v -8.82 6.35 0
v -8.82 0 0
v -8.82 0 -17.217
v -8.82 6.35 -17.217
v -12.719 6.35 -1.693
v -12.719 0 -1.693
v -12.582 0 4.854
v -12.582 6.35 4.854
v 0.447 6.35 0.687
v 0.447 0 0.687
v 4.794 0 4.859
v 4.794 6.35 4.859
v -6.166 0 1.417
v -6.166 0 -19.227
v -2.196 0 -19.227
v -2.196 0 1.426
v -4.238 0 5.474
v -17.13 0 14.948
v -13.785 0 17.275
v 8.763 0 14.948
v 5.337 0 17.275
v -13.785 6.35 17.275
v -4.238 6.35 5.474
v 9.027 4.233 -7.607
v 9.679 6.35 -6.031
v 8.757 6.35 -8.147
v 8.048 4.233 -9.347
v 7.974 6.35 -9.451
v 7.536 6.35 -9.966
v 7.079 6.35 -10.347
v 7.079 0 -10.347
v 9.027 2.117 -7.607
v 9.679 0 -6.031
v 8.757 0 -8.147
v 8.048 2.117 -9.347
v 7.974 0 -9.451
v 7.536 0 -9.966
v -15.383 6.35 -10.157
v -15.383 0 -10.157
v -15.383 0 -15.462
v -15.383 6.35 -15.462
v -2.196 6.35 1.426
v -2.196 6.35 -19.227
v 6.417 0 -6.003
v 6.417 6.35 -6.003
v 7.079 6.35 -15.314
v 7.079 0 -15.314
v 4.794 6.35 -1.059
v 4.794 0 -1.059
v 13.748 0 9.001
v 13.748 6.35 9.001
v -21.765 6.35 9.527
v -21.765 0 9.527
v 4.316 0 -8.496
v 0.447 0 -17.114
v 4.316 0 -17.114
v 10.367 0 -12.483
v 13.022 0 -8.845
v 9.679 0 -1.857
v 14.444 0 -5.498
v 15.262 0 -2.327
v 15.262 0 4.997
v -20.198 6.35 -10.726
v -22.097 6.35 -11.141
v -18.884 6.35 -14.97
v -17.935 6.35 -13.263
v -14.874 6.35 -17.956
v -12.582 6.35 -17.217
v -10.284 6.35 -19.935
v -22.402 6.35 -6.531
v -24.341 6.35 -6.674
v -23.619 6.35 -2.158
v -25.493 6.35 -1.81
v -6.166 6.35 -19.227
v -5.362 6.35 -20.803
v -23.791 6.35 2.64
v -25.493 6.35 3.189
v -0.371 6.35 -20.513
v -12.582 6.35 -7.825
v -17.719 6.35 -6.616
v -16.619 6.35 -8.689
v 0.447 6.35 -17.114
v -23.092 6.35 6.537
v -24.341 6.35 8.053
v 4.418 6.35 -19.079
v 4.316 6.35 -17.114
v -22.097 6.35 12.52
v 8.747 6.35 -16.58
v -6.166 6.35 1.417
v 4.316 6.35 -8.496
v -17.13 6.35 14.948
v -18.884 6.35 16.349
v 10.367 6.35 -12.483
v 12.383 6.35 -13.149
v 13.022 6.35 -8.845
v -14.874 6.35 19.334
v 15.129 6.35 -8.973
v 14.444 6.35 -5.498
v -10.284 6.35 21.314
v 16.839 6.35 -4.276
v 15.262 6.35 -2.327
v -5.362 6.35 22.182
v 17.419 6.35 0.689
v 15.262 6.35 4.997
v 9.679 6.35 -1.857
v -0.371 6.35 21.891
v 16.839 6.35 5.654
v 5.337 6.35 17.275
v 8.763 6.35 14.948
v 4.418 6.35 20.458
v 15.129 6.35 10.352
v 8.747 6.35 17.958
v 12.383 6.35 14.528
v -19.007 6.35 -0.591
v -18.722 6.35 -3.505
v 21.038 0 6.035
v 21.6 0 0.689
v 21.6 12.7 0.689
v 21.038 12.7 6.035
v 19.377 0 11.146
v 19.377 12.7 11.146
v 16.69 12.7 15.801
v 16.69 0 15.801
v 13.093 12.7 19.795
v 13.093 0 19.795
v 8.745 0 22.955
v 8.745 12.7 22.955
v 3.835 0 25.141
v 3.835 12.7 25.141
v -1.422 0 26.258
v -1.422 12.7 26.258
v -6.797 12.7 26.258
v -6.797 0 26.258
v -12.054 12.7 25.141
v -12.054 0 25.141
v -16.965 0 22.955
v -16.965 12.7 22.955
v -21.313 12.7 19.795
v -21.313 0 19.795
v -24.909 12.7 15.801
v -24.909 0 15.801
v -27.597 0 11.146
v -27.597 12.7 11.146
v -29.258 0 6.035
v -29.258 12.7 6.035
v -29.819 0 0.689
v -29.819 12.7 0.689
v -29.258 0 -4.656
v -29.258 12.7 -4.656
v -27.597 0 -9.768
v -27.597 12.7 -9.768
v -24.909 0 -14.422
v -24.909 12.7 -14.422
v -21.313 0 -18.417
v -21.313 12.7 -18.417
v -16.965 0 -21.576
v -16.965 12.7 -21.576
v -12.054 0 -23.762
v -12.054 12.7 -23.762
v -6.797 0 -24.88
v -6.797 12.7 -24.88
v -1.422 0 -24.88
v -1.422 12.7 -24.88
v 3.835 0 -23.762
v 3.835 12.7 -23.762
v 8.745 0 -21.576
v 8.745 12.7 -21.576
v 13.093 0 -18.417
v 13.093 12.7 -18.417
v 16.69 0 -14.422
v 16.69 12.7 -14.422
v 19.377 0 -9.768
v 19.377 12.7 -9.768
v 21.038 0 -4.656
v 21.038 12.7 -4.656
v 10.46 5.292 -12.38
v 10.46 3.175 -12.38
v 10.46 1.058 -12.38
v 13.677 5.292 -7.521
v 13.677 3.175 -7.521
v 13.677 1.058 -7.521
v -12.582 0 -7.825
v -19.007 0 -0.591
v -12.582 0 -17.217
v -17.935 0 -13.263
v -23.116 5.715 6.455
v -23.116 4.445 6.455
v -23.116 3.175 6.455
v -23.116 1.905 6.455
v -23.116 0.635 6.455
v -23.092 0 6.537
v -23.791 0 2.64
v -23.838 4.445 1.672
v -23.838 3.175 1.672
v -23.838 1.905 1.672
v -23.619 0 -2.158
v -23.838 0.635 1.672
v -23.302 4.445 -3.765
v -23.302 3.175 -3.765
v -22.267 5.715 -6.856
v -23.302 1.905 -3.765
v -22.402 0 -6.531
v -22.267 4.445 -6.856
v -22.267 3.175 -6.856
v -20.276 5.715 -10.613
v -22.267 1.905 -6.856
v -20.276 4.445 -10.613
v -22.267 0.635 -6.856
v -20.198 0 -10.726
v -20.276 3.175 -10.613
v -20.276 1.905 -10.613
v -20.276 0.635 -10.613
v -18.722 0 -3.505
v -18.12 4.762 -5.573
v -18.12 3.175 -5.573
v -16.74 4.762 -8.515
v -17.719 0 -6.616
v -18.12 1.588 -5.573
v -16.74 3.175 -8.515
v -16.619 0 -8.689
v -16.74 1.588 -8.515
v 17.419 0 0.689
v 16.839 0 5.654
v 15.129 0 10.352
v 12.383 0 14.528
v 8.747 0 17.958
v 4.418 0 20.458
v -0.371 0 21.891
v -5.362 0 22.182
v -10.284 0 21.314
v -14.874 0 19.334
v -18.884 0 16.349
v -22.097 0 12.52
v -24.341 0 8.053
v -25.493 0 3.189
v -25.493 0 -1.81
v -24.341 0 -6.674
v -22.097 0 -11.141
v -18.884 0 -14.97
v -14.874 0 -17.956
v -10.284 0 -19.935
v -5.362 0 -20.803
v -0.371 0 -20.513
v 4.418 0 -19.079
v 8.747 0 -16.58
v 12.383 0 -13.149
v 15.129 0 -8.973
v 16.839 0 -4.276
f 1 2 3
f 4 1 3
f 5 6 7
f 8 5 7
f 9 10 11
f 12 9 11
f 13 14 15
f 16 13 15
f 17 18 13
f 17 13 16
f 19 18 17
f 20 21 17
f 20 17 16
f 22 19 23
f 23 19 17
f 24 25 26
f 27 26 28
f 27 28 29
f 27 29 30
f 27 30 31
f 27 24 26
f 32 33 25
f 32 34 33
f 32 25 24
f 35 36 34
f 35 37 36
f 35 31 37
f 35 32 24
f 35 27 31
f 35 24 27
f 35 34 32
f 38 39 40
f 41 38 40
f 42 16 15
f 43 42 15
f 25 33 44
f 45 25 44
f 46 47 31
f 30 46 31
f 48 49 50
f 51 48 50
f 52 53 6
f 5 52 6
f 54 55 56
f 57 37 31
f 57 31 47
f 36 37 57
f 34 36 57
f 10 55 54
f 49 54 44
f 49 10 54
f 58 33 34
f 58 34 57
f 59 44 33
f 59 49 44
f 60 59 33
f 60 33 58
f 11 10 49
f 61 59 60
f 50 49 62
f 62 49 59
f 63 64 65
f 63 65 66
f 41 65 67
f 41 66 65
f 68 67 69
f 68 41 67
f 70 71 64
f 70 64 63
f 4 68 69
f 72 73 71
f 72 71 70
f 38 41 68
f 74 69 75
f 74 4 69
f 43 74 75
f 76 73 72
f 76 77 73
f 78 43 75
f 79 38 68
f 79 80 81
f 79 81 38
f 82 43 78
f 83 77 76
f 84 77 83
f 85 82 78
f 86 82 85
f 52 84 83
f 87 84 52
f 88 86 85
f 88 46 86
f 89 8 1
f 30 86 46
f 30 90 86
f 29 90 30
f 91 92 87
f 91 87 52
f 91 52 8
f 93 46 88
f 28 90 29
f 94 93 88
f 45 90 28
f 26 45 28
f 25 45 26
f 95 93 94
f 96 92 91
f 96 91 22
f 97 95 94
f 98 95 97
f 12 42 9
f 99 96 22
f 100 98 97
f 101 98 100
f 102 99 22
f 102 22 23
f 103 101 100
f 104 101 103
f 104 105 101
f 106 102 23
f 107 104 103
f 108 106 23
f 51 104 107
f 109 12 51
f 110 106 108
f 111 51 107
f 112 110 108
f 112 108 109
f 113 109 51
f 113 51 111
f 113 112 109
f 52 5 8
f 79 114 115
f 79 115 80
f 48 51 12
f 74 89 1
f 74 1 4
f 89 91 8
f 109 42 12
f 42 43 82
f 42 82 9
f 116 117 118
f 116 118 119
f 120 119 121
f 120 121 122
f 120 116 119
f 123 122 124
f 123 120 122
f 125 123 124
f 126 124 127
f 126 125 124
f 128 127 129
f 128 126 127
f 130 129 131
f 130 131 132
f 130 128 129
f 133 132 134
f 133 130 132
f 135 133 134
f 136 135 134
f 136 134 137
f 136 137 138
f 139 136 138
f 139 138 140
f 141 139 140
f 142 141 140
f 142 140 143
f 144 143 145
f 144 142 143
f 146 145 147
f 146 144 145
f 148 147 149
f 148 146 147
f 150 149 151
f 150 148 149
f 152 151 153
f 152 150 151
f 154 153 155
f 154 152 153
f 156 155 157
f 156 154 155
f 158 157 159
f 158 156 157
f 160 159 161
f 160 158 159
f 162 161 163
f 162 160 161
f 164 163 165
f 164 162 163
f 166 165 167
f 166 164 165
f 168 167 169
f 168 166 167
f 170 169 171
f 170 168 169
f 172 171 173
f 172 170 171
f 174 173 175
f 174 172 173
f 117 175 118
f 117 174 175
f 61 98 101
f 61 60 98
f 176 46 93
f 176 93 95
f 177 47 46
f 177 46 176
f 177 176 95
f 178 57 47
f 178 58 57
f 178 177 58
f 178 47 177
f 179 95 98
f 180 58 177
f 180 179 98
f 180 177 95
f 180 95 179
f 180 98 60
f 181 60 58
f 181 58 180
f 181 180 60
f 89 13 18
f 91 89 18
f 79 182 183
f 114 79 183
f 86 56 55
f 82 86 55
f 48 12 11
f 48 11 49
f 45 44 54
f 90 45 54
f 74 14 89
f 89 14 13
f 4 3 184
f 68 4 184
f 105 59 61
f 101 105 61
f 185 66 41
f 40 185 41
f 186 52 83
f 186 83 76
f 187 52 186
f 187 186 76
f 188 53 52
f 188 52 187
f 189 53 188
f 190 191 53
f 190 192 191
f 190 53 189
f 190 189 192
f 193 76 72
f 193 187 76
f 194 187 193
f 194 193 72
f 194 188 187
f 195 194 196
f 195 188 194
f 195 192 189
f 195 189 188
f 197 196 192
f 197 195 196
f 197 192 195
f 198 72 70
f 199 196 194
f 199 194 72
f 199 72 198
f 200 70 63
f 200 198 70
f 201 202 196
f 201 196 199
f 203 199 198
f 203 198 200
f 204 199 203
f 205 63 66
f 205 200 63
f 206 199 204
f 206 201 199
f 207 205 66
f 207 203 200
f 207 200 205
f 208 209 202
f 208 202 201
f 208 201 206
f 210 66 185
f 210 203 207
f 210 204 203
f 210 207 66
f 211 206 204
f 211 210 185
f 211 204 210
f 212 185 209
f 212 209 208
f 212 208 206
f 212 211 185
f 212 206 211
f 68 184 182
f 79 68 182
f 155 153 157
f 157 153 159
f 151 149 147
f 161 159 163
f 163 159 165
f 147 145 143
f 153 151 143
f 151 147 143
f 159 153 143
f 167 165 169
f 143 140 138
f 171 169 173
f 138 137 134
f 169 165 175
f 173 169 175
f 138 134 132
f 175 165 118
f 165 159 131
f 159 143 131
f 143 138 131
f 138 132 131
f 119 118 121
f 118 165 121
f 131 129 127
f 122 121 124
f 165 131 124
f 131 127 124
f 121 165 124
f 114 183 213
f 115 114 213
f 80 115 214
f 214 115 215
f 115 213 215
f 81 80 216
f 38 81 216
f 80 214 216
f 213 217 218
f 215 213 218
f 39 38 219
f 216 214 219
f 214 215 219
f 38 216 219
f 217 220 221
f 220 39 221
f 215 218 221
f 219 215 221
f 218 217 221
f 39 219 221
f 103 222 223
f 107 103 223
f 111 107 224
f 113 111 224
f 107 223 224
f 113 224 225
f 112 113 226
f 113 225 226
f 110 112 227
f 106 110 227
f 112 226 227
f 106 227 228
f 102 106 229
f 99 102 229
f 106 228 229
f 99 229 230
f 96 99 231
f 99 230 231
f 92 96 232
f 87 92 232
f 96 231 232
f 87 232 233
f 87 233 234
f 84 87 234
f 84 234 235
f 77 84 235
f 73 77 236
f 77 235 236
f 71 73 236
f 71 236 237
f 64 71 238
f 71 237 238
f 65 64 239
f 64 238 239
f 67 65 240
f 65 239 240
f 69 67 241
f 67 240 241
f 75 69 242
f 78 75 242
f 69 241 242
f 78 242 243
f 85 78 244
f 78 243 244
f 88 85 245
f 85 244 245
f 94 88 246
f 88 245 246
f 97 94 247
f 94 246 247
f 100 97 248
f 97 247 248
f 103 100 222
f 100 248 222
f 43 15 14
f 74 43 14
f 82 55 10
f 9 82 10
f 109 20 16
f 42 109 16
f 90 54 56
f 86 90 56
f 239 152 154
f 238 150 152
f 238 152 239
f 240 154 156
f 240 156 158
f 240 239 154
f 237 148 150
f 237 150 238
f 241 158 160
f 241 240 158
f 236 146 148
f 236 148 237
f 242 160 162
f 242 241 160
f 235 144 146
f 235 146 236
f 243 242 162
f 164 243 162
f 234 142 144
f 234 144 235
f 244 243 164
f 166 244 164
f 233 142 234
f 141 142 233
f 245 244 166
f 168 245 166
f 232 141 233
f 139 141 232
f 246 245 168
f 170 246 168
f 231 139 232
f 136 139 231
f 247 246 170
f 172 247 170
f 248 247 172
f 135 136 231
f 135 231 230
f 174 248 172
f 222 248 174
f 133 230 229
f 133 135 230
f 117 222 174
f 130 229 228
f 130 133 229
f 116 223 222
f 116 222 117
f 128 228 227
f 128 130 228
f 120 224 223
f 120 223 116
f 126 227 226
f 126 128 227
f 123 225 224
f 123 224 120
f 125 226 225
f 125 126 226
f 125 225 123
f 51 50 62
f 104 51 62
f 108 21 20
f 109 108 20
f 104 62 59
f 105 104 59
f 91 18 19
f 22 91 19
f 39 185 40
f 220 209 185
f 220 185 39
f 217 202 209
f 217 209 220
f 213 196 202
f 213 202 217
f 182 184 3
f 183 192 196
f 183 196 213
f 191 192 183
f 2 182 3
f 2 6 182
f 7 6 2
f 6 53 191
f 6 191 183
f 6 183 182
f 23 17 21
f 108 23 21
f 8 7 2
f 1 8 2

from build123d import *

# Parameters (mm, degrees)
F0_R     = 25.7096861459
F0_R_2   = 21.5291868396
F1_DEPTH = 12.7
F2_DEPTH = 6.35


with BuildPart() as f1:
    # F0 (on Front) → F1 (new body)
    with BuildSketch(Plane.XZ):
        with Locations((-4.1097430512, 0.6892834396)):
            Circle(F0_R)
        with Locations((-4.1097430512, 0.6892834396)):
            Circle(F0_R_2, mode=Mode.SUBTRACT)
        with Locations((-4.1097430512, 0.6892834396)):
            Circle(F0_R_2)
        with BuildLine():
            add(Edge.make_bspline(
                [(-21.7646267265, 9.5272203907), (-22.0361650363, 9.0544517802), (-22.5884434109, 8.0928936123), (-23.1549316669, 6.4432599282), (-23.7184446326, 4.0522965999), (-23.8577617277, 1.6539462794), (-23.873036412, -0.6564562902), (-23.37210285, -3.8672122774), (-22.351295624, -6.8736988545), (-20.4256595912, -10.740114232), (-18.0343458286, -13.2630401234), (-16.2631639399, -14.7318578221), (-15.3828011826, -15.4619310051)],
                knots=[0, 0, 0, 0, 0.0768675769, 0.1563400039, 0.2507506226, 0.3440400191, 0.4356860283, 0.542918844, 0.6517355024, 0.7760210951, 0.88867169, 1, 1, 1, 1], degree=3))
            Line((-21.7646267265, 9.5272203907), (-12.7189774066, -1.692944672))
            Line((-12.7189774066, -1.692944672), (-12.5821670517, 4.8544136807))
            Line((-12.5821670517, 4.8544136807), (-8.8198259473, 0))
            Line((-8.8198259473, 0), (-8.8198259473, -17.2167737037))
            Line((-8.8198259473, -17.2167737037), (-12.5821670517, -17.2167737037))
            Line((-12.5821670517, -17.2167737037), (-12.5821670517, -7.8245121986))
            Line((-12.5821670517, -7.8245121986), (-19.0072003752, -0.591270742))
            add(Edge.make_bspline(
                [(-19.0072003752, -0.591270742), (-19.0529774008, -1.3011197697), (-18.8961779325, -3.0224064452), (-18.1968595875, -5.5618282654), (-16.9006426097, -8.6077330024), (-15.8092020333, -9.6299122724), (-15.3828011826, -10.1572088897)],
                knots=[0, 0, 0, 0, 0.2376816547, 0.494126058, 0.7736790575, 1, 1, 1, 1], degree=3))
            Line((-15.3828011826, -10.1572088897), (-15.3828011826, -15.4619310051))
        make_face(mode=Mode.SUBTRACT)
        Polygon((-6.1660036445, -19.2273277789), (-6.1660036445, -19.0120320767), (-6.1660036445, 1.4170210343), (-17.1303842217, 14.948152937), (-13.7848015875, 17.2754023224), (-4.2383992113, 5.4741743952), (5.3372876719, 17.2754023224), (8.7634501979, 14.948152937), (-2.1964707835, 1.426110025), (-2.1964707835, -19.2273277789), align=None, mode=Mode.SUBTRACT)
        with BuildLine():
            Line((0.4468376574, -17.1141084284), (0.4468376574, 0.6865304422))
            Line((0.4468376574, 0.6865304422), (4.7943019308, 4.8586851917))
            Line((4.7943019308, 4.8586851917), (4.7943019308, -1.0591812897))
            Line((4.7943019308, -1.0591812897), (13.7482034042, 9.0009113774))
            Line((13.7482034042, 9.0009113774), (15.2618186548, 4.9968691602))
            Line((15.2618186548, 4.9968691602), (9.6785612404, -1.8568894593))
            Line((9.6785612404, -1.8568894593), (15.2618186548, -2.3267676588))
            add(Edge.make_bspline(
                [(7.0791435428, -15.3138078749), (7.6633822301, -14.891566438), (8.8605857195, -14.0262415468), (10.5105583239, -12.413425436), (12.4261537458, -9.9596070935), (13.742152602, -7.5968455621), (14.7711233204, -4.5638277141), (15.2065390721, -3.0454047956), (15.2618186548, -2.3267676588)],
                knots=[0, 0, 0, 0, 0.1516433597, 0.3087204032, 0.4892664729, 0.6610846718, 0.8445997083, 1, 1, 1, 1], degree=3))
            Line((7.0791435428, -15.3138078749), (7.0791435428, -10.3469491005))
            add(Edge.make_bspline(
                [(9.6785612404, -6.0305129737), (9.5054491582, -6.5825324176), (9.0547490041, -7.5936580594), (8.125887942, -9.3747254345), (7.432360992, -10.108098995), (7.0791435428, -10.3469491005)],
                knots=[0, 0, 0, 0, 0.3349951173, 0.6974045589, 1, 1, 1, 1], degree=3))
            Line((9.6785612404, -6.0305129737), (6.4170542173, -6.0028731823))
            Line((6.4170542173, -6.0028731823), (4.316422157, -8.4956227616))
            Line((4.316422157, -8.4956227616), (4.316422157, -17.1141084284))
            Line((4.316422157, -17.1141084284), (0.4468376574, -17.1141084284))
        make_face(mode=Mode.SUBTRACT)
        with BuildLine():
            Line((-12.7189774066, -1.692944672), (-21.7646267265, 9.5272203907))
            add(Edge.make_bspline(
                [(-21.7646267265, 9.5272203907), (-22.0361650363, 9.0544517802), (-22.5884434109, 8.0928936123), (-23.1549316669, 6.4432599282), (-23.7184446326, 4.0522965999), (-23.8577617277, 1.6539462794), (-23.873036412, -0.6564562902), (-23.37210285, -3.8672122774), (-22.351295624, -6.8736988545), (-20.4256595912, -10.740114232), (-18.0343458286, -13.2630401234), (-16.2631639399, -14.7318578221), (-15.3828011826, -15.4619310051)],
                knots=[0, 0, 0, 0, 0.0768675769, 0.1563400039, 0.2507506226, 0.3440400191, 0.4356860283, 0.542918844, 0.6517355024, 0.7760210951, 0.88867169, 1, 1, 1, 1], degree=3))
            Line((-15.3828011826, -15.4619310051), (-15.3828011826, -10.1572088897))
            add(Edge.make_bspline(
                [(-19.0072003752, -0.591270742), (-19.0529774008, -1.3011197697), (-18.8961779325, -3.0224064452), (-18.1968595875, -5.5618282654), (-16.9006426097, -8.6077330024), (-15.8092020333, -9.6299122724), (-15.3828011826, -10.1572088897)],
                knots=[0, 0, 0, 0, 0.2376816547, 0.494126058, 0.7736790575, 1, 1, 1, 1], degree=3))
            Line((-19.0072003752, -0.591270742), (-12.5821670517, -7.8245121986))
            Line((-12.5821670517, -7.8245121986), (-12.5821670517, -17.2167737037))
            Line((-12.5821670517, -17.2167737037), (-8.8198259473, -17.2167737037))
            Line((-8.8198259473, -17.2167737037), (-8.8198259473, 0))
            Line((-8.8198259473, 0), (-12.5821670517, 4.8544136807))
            Line((-12.5821670517, 4.8544136807), (-12.7189774066, -1.692944672))
        make_face()
        Polygon((-6.1660036445, 1.4170210343), (-6.1660036445, -19.0120320767), (-6.1660036445, -19.2273277789), (-2.1964707835, -19.2273277789), (-2.1964707835, 1.426110025), (8.7634501979, 14.948152937), (5.3372876719, 17.2754023224), (-4.2383992113, 5.4741743952), (-13.7848015875, 17.2754023224), (-17.1303842217, 14.948152937), align=None)
        with BuildLine():
            Line((4.7943019308, 4.8586851917), (0.4468376574, 0.6865304422))
            Line((0.4468376574, 0.6865304422), (0.4468376574, -17.1141084284))
            Line((0.4468376574, -17.1141084284), (4.316422157, -17.1141084284))
            Line((4.316422157, -17.1141084284), (4.316422157, -8.4956227616))
            Line((4.316422157, -8.4956227616), (6.4170542173, -6.0028731823))
            Line((6.4170542173, -6.0028731823), (9.6785612404, -6.0305129737))
            add(Edge.make_bspline(
                [(9.6785612404, -6.0305129737), (9.5054491582, -6.5825324176), (9.0547490041, -7.5936580594), (8.125887942, -9.3747254345), (7.432360992, -10.108098995), (7.0791435428, -10.3469491005)],
                knots=[0, 0, 0, 0, 0.3349951173, 0.6974045589, 1, 1, 1, 1], degree=3))
            Line((7.0791435428, -10.3469491005), (7.0791435428, -15.3138078749))
            add(Edge.make_bspline(
                [(7.0791435428, -15.3138078749), (7.6633822301, -14.891566438), (8.8605857195, -14.0262415468), (10.5105583239, -12.413425436), (12.4261537458, -9.9596070935), (13.742152602, -7.5968455621), (14.7711233204, -4.5638277141), (15.2065390721, -3.0454047956), (15.2618186548, -2.3267676588)],
                knots=[0, 0, 0, 0, 0.1516433597, 0.3087204032, 0.4892664729, 0.6610846718, 0.8445997083, 1, 1, 1, 1], degree=3))
            Line((15.2618186548, -2.3267676588), (9.6785612404, -1.8568894593))
            Line((9.6785612404, -1.8568894593), (15.2618186548, 4.9968691602))
            Line((15.2618186548, 4.9968691602), (13.7482034042, 9.0009113774))
            Line((13.7482034042, 9.0009113774), (4.7943019308, -1.0591812897))
            Line((4.7943019308, -1.0591812897), (4.7943019308, 4.8586851917))
        make_face()
    extrude(amount=-F1_DEPTH)

    # F0 (on Front) → F2 (cut)
    with BuildSketch(Plane.XZ):
        with Locations((-4.1097430512, 0.6892834396)):
            Circle(F0_R_2)
        with BuildLine():
            add(Edge.make_bspline(
                [(-21.7646267265, 9.5272203907), (-22.0361650363, 9.0544517802), (-22.5884434109, 8.0928936123), (-23.1549316669, 6.4432599282), (-23.7184446326, 4.0522965999), (-23.8577617277, 1.6539462794), (-23.873036412, -0.6564562902), (-23.37210285, -3.8672122774), (-22.351295624, -6.8736988545), (-20.4256595912, -10.740114232), (-18.0343458286, -13.2630401234), (-16.2631639399, -14.7318578221), (-15.3828011826, -15.4619310051)],
                knots=[0, 0, 0, 0, 0.0768675769, 0.1563400039, 0.2507506226, 0.3440400191, 0.4356860283, 0.542918844, 0.6517355024, 0.7760210951, 0.88867169, 1, 1, 1, 1], degree=3))
            Line((-21.7646267265, 9.5272203907), (-12.7189774066, -1.692944672))
            Line((-12.7189774066, -1.692944672), (-12.5821670517, 4.8544136807))
            Line((-12.5821670517, 4.8544136807), (-8.8198259473, 0))
            Line((-8.8198259473, 0), (-8.8198259473, -17.2167737037))
            Line((-8.8198259473, -17.2167737037), (-12.5821670517, -17.2167737037))
            Line((-12.5821670517, -17.2167737037), (-12.5821670517, -7.8245121986))
            Line((-12.5821670517, -7.8245121986), (-19.0072003752, -0.591270742))
            add(Edge.make_bspline(
                [(-19.0072003752, -0.591270742), (-19.0529774008, -1.3011197697), (-18.8961779325, -3.0224064452), (-18.1968595875, -5.5618282654), (-16.9006426097, -8.6077330024), (-15.8092020333, -9.6299122724), (-15.3828011826, -10.1572088897)],
                knots=[0, 0, 0, 0, 0.2376816547, 0.494126058, 0.7736790575, 1, 1, 1, 1], degree=3))
            Line((-15.3828011826, -10.1572088897), (-15.3828011826, -15.4619310051))
        make_face(mode=Mode.SUBTRACT)
        Polygon((-6.1660036445, -19.2273277789), (-6.1660036445, -19.0120320767), (-6.1660036445, 1.4170210343), (-17.1303842217, 14.948152937), (-13.7848015875, 17.2754023224), (-4.2383992113, 5.4741743952), (5.3372876719, 17.2754023224), (8.7634501979, 14.948152937), (-2.1964707835, 1.426110025), (-2.1964707835, -19.2273277789), align=None, mode=Mode.SUBTRACT)
        with BuildLine():
            Line((0.4468376574, -17.1141084284), (0.4468376574, 0.6865304422))
            Line((0.4468376574, 0.6865304422), (4.7943019308, 4.8586851917))
            Line((4.7943019308, 4.8586851917), (4.7943019308, -1.0591812897))
            Line((4.7943019308, -1.0591812897), (13.7482034042, 9.0009113774))
            Line((13.7482034042, 9.0009113774), (15.2618186548, 4.9968691602))
            Line((15.2618186548, 4.9968691602), (9.6785612404, -1.8568894593))
            Line((9.6785612404, -1.8568894593), (15.2618186548, -2.3267676588))
            add(Edge.make_bspline(
                [(7.0791435428, -15.3138078749), (7.6633822301, -14.891566438), (8.8605857195, -14.0262415468), (10.5105583239, -12.413425436), (12.4261537458, -9.9596070935), (13.742152602, -7.5968455621), (14.7711233204, -4.5638277141), (15.2065390721, -3.0454047956), (15.2618186548, -2.3267676588)],
                knots=[0, 0, 0, 0, 0.1516433597, 0.3087204032, 0.4892664729, 0.6610846718, 0.8445997083, 1, 1, 1, 1], degree=3))
            Line((7.0791435428, -15.3138078749), (7.0791435428, -10.3469491005))
            add(Edge.make_bspline(
                [(9.6785612404, -6.0305129737), (9.5054491582, -6.5825324176), (9.0547490041, -7.5936580594), (8.125887942, -9.3747254345), (7.432360992, -10.108098995), (7.0791435428, -10.3469491005)],
                knots=[0, 0, 0, 0, 0.3349951173, 0.6974045589, 1, 1, 1, 1], degree=3))
            Line((9.6785612404, -6.0305129737), (6.4170542173, -6.0028731823))
            Line((6.4170542173, -6.0028731823), (4.316422157, -8.4956227616))
            Line((4.316422157, -8.4956227616), (4.316422157, -17.1141084284))
            Line((4.316422157, -17.1141084284), (0.4468376574, -17.1141084284))
        make_face(mode=Mode.SUBTRACT)
    extrude(amount=-F2_DEPTH, mode=Mode.SUBTRACT)


solid = f1.part
